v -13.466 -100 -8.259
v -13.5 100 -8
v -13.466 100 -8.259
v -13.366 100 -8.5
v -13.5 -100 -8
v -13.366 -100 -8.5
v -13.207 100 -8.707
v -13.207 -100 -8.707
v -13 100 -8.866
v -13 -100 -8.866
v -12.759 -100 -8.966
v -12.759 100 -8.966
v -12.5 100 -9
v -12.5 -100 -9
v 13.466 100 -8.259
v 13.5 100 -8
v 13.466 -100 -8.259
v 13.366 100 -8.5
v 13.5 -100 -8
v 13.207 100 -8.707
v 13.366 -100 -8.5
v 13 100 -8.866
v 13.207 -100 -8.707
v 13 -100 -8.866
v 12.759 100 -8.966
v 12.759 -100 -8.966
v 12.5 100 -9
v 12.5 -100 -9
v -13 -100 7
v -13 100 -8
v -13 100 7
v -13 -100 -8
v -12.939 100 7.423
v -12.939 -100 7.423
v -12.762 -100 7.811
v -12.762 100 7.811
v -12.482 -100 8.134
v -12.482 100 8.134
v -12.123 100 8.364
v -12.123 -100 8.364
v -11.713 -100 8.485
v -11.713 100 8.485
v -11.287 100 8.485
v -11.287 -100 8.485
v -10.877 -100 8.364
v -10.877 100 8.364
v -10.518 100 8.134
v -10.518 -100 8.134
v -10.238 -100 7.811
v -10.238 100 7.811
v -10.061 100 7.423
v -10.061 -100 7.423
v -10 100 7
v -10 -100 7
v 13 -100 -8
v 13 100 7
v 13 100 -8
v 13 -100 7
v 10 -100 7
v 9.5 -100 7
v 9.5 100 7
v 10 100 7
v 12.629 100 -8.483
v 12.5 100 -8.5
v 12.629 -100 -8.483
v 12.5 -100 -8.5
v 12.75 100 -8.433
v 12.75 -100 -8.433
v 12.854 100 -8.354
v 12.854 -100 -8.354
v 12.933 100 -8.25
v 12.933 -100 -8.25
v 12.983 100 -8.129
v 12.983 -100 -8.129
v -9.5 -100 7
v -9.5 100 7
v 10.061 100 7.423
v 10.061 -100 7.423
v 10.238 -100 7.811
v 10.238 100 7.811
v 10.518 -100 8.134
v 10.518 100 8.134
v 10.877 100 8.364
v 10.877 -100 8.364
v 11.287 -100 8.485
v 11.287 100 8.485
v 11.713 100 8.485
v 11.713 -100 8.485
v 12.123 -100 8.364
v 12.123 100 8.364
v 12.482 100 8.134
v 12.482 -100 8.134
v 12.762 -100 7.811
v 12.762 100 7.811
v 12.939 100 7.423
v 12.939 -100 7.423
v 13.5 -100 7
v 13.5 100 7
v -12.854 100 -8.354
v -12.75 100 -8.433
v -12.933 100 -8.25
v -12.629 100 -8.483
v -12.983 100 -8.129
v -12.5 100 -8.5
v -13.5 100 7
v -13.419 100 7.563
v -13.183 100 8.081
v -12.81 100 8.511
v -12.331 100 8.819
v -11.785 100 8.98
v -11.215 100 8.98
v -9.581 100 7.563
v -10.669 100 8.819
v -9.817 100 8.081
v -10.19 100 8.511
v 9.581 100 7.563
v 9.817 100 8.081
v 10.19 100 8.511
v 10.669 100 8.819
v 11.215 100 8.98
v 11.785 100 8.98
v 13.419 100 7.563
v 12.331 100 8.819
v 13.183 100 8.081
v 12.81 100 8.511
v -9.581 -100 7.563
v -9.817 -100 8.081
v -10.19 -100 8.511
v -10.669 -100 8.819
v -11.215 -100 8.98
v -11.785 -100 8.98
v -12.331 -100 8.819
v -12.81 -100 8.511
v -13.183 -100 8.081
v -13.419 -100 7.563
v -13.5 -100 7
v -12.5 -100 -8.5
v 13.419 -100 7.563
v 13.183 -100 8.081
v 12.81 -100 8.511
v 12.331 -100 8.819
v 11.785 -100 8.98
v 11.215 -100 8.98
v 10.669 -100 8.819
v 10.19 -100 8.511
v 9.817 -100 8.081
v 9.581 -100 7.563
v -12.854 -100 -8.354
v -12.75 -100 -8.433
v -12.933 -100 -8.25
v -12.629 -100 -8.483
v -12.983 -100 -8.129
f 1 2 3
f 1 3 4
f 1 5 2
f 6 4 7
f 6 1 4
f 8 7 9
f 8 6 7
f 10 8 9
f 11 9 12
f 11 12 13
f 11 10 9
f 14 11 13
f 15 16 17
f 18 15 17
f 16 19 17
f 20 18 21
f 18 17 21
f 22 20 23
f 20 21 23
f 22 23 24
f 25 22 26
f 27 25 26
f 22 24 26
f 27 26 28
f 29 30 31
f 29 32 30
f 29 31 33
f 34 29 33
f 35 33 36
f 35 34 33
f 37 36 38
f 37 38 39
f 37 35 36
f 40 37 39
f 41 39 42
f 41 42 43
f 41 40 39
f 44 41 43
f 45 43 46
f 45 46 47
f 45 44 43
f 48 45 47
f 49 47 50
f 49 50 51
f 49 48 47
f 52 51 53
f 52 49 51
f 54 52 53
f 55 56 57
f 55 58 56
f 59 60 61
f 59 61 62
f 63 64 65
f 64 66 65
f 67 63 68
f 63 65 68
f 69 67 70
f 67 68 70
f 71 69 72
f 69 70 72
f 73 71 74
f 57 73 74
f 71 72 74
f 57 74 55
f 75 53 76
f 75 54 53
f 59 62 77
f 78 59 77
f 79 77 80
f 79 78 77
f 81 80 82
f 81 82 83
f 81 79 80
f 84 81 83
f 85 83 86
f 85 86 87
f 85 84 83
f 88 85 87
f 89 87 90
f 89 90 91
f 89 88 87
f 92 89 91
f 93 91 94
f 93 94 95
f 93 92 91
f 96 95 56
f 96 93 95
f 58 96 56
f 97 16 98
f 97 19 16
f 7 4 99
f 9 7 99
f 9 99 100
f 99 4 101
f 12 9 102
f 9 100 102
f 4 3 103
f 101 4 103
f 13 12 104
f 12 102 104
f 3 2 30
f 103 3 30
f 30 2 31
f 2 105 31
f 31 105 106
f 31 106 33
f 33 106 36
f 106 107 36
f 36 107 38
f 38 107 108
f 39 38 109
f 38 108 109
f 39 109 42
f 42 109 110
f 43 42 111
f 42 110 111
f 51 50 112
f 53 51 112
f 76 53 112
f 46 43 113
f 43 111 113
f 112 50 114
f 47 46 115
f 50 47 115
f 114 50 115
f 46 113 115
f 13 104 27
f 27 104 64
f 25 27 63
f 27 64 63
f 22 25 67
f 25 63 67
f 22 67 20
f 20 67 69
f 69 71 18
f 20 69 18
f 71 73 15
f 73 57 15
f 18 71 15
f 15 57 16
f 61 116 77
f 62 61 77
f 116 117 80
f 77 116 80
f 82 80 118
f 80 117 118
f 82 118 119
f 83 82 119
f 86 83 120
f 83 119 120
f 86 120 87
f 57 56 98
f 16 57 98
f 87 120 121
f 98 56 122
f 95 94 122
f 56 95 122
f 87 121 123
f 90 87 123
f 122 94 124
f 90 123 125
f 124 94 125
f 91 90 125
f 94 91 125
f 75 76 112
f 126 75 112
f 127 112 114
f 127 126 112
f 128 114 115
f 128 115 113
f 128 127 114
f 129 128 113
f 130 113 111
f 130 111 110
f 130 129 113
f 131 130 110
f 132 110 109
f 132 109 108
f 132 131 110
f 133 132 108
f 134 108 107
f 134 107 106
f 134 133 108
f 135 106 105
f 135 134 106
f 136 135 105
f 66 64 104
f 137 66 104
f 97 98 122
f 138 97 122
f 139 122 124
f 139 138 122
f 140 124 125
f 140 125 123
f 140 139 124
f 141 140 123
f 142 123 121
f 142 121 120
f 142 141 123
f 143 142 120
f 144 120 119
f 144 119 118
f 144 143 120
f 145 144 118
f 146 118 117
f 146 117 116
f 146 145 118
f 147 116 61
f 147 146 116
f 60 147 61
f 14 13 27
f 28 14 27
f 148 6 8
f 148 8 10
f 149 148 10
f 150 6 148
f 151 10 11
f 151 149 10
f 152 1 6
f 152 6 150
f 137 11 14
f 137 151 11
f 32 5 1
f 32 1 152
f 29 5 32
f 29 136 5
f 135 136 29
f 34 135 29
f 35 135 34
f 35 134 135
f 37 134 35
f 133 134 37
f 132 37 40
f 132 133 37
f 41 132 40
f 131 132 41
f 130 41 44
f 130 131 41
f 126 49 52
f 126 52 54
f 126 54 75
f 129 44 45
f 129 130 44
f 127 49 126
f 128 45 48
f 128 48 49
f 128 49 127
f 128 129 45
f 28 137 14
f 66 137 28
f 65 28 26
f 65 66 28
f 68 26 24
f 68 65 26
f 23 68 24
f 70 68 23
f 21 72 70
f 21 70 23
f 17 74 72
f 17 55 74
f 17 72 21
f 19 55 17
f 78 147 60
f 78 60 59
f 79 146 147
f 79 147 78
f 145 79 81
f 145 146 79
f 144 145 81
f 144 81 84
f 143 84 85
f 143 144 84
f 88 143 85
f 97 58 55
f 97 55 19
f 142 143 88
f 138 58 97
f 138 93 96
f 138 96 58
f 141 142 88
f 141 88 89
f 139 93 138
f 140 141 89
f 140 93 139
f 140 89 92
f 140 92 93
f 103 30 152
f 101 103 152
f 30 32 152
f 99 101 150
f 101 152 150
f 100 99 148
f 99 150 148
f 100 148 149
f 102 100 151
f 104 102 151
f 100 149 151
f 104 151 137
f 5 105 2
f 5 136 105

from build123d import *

# Parameters (mm, degrees)
F1_DEPTH      = 100
F1_DEPTH_BACK = 100
F2_R          = 1
F3_R          = 0.5


with BuildPart() as f1:
    # F0 (on Front) → F1 (new body, two sides)
    with BuildSketch(Plane.XZ) as f1_sk:
        with BuildLine():
            Line((-13.5, 7), (-13.5, -9))
            Line((-13.5, -9), (13.5, -9))
            Line((13.5, -9), (13.5, 7))
            ThreePointArc((13.5, 7), (11.5, 9), (9.5, 7))
            Line((9.5, 7), (10, 7))
            ThreePointArc((10, 7), (11.5, 8.5), (13, 7))
            Line((13, 7), (13, -8.5))
            Line((13, -8.5), (-13, -8.5))
            Line((-13, -8.5), (-13, 7))
            ThreePointArc((-13, 7), (-11.5, 8.5), (-10, 7))
            Line((-10, 7), (-9.5, 7))
            ThreePointArc((-9.5, 7), (-11.5, 9), (-13.5, 7))
        make_face()
    extrude(amount=F1_DEPTH)
    extrude(f1_sk.sketch, amount=-F1_DEPTH_BACK)

    # F2
    f2_edges = [f1.edges().sort_by_distance(p)[0] for p in [
        (13.5, 0, -9),
        (-13.5, 0, -9),
    ]]
    fillet(f2_edges, radius=F2_R)

    # F3
    f3_edges = [f1.edges().sort_by_distance(p)[0] for p in [
        (-13, 0, -8.5),
        (13, 0, -8.5),
    ]]
    fillet(f3_edges, radius=F3_R)


solid = f1.part
